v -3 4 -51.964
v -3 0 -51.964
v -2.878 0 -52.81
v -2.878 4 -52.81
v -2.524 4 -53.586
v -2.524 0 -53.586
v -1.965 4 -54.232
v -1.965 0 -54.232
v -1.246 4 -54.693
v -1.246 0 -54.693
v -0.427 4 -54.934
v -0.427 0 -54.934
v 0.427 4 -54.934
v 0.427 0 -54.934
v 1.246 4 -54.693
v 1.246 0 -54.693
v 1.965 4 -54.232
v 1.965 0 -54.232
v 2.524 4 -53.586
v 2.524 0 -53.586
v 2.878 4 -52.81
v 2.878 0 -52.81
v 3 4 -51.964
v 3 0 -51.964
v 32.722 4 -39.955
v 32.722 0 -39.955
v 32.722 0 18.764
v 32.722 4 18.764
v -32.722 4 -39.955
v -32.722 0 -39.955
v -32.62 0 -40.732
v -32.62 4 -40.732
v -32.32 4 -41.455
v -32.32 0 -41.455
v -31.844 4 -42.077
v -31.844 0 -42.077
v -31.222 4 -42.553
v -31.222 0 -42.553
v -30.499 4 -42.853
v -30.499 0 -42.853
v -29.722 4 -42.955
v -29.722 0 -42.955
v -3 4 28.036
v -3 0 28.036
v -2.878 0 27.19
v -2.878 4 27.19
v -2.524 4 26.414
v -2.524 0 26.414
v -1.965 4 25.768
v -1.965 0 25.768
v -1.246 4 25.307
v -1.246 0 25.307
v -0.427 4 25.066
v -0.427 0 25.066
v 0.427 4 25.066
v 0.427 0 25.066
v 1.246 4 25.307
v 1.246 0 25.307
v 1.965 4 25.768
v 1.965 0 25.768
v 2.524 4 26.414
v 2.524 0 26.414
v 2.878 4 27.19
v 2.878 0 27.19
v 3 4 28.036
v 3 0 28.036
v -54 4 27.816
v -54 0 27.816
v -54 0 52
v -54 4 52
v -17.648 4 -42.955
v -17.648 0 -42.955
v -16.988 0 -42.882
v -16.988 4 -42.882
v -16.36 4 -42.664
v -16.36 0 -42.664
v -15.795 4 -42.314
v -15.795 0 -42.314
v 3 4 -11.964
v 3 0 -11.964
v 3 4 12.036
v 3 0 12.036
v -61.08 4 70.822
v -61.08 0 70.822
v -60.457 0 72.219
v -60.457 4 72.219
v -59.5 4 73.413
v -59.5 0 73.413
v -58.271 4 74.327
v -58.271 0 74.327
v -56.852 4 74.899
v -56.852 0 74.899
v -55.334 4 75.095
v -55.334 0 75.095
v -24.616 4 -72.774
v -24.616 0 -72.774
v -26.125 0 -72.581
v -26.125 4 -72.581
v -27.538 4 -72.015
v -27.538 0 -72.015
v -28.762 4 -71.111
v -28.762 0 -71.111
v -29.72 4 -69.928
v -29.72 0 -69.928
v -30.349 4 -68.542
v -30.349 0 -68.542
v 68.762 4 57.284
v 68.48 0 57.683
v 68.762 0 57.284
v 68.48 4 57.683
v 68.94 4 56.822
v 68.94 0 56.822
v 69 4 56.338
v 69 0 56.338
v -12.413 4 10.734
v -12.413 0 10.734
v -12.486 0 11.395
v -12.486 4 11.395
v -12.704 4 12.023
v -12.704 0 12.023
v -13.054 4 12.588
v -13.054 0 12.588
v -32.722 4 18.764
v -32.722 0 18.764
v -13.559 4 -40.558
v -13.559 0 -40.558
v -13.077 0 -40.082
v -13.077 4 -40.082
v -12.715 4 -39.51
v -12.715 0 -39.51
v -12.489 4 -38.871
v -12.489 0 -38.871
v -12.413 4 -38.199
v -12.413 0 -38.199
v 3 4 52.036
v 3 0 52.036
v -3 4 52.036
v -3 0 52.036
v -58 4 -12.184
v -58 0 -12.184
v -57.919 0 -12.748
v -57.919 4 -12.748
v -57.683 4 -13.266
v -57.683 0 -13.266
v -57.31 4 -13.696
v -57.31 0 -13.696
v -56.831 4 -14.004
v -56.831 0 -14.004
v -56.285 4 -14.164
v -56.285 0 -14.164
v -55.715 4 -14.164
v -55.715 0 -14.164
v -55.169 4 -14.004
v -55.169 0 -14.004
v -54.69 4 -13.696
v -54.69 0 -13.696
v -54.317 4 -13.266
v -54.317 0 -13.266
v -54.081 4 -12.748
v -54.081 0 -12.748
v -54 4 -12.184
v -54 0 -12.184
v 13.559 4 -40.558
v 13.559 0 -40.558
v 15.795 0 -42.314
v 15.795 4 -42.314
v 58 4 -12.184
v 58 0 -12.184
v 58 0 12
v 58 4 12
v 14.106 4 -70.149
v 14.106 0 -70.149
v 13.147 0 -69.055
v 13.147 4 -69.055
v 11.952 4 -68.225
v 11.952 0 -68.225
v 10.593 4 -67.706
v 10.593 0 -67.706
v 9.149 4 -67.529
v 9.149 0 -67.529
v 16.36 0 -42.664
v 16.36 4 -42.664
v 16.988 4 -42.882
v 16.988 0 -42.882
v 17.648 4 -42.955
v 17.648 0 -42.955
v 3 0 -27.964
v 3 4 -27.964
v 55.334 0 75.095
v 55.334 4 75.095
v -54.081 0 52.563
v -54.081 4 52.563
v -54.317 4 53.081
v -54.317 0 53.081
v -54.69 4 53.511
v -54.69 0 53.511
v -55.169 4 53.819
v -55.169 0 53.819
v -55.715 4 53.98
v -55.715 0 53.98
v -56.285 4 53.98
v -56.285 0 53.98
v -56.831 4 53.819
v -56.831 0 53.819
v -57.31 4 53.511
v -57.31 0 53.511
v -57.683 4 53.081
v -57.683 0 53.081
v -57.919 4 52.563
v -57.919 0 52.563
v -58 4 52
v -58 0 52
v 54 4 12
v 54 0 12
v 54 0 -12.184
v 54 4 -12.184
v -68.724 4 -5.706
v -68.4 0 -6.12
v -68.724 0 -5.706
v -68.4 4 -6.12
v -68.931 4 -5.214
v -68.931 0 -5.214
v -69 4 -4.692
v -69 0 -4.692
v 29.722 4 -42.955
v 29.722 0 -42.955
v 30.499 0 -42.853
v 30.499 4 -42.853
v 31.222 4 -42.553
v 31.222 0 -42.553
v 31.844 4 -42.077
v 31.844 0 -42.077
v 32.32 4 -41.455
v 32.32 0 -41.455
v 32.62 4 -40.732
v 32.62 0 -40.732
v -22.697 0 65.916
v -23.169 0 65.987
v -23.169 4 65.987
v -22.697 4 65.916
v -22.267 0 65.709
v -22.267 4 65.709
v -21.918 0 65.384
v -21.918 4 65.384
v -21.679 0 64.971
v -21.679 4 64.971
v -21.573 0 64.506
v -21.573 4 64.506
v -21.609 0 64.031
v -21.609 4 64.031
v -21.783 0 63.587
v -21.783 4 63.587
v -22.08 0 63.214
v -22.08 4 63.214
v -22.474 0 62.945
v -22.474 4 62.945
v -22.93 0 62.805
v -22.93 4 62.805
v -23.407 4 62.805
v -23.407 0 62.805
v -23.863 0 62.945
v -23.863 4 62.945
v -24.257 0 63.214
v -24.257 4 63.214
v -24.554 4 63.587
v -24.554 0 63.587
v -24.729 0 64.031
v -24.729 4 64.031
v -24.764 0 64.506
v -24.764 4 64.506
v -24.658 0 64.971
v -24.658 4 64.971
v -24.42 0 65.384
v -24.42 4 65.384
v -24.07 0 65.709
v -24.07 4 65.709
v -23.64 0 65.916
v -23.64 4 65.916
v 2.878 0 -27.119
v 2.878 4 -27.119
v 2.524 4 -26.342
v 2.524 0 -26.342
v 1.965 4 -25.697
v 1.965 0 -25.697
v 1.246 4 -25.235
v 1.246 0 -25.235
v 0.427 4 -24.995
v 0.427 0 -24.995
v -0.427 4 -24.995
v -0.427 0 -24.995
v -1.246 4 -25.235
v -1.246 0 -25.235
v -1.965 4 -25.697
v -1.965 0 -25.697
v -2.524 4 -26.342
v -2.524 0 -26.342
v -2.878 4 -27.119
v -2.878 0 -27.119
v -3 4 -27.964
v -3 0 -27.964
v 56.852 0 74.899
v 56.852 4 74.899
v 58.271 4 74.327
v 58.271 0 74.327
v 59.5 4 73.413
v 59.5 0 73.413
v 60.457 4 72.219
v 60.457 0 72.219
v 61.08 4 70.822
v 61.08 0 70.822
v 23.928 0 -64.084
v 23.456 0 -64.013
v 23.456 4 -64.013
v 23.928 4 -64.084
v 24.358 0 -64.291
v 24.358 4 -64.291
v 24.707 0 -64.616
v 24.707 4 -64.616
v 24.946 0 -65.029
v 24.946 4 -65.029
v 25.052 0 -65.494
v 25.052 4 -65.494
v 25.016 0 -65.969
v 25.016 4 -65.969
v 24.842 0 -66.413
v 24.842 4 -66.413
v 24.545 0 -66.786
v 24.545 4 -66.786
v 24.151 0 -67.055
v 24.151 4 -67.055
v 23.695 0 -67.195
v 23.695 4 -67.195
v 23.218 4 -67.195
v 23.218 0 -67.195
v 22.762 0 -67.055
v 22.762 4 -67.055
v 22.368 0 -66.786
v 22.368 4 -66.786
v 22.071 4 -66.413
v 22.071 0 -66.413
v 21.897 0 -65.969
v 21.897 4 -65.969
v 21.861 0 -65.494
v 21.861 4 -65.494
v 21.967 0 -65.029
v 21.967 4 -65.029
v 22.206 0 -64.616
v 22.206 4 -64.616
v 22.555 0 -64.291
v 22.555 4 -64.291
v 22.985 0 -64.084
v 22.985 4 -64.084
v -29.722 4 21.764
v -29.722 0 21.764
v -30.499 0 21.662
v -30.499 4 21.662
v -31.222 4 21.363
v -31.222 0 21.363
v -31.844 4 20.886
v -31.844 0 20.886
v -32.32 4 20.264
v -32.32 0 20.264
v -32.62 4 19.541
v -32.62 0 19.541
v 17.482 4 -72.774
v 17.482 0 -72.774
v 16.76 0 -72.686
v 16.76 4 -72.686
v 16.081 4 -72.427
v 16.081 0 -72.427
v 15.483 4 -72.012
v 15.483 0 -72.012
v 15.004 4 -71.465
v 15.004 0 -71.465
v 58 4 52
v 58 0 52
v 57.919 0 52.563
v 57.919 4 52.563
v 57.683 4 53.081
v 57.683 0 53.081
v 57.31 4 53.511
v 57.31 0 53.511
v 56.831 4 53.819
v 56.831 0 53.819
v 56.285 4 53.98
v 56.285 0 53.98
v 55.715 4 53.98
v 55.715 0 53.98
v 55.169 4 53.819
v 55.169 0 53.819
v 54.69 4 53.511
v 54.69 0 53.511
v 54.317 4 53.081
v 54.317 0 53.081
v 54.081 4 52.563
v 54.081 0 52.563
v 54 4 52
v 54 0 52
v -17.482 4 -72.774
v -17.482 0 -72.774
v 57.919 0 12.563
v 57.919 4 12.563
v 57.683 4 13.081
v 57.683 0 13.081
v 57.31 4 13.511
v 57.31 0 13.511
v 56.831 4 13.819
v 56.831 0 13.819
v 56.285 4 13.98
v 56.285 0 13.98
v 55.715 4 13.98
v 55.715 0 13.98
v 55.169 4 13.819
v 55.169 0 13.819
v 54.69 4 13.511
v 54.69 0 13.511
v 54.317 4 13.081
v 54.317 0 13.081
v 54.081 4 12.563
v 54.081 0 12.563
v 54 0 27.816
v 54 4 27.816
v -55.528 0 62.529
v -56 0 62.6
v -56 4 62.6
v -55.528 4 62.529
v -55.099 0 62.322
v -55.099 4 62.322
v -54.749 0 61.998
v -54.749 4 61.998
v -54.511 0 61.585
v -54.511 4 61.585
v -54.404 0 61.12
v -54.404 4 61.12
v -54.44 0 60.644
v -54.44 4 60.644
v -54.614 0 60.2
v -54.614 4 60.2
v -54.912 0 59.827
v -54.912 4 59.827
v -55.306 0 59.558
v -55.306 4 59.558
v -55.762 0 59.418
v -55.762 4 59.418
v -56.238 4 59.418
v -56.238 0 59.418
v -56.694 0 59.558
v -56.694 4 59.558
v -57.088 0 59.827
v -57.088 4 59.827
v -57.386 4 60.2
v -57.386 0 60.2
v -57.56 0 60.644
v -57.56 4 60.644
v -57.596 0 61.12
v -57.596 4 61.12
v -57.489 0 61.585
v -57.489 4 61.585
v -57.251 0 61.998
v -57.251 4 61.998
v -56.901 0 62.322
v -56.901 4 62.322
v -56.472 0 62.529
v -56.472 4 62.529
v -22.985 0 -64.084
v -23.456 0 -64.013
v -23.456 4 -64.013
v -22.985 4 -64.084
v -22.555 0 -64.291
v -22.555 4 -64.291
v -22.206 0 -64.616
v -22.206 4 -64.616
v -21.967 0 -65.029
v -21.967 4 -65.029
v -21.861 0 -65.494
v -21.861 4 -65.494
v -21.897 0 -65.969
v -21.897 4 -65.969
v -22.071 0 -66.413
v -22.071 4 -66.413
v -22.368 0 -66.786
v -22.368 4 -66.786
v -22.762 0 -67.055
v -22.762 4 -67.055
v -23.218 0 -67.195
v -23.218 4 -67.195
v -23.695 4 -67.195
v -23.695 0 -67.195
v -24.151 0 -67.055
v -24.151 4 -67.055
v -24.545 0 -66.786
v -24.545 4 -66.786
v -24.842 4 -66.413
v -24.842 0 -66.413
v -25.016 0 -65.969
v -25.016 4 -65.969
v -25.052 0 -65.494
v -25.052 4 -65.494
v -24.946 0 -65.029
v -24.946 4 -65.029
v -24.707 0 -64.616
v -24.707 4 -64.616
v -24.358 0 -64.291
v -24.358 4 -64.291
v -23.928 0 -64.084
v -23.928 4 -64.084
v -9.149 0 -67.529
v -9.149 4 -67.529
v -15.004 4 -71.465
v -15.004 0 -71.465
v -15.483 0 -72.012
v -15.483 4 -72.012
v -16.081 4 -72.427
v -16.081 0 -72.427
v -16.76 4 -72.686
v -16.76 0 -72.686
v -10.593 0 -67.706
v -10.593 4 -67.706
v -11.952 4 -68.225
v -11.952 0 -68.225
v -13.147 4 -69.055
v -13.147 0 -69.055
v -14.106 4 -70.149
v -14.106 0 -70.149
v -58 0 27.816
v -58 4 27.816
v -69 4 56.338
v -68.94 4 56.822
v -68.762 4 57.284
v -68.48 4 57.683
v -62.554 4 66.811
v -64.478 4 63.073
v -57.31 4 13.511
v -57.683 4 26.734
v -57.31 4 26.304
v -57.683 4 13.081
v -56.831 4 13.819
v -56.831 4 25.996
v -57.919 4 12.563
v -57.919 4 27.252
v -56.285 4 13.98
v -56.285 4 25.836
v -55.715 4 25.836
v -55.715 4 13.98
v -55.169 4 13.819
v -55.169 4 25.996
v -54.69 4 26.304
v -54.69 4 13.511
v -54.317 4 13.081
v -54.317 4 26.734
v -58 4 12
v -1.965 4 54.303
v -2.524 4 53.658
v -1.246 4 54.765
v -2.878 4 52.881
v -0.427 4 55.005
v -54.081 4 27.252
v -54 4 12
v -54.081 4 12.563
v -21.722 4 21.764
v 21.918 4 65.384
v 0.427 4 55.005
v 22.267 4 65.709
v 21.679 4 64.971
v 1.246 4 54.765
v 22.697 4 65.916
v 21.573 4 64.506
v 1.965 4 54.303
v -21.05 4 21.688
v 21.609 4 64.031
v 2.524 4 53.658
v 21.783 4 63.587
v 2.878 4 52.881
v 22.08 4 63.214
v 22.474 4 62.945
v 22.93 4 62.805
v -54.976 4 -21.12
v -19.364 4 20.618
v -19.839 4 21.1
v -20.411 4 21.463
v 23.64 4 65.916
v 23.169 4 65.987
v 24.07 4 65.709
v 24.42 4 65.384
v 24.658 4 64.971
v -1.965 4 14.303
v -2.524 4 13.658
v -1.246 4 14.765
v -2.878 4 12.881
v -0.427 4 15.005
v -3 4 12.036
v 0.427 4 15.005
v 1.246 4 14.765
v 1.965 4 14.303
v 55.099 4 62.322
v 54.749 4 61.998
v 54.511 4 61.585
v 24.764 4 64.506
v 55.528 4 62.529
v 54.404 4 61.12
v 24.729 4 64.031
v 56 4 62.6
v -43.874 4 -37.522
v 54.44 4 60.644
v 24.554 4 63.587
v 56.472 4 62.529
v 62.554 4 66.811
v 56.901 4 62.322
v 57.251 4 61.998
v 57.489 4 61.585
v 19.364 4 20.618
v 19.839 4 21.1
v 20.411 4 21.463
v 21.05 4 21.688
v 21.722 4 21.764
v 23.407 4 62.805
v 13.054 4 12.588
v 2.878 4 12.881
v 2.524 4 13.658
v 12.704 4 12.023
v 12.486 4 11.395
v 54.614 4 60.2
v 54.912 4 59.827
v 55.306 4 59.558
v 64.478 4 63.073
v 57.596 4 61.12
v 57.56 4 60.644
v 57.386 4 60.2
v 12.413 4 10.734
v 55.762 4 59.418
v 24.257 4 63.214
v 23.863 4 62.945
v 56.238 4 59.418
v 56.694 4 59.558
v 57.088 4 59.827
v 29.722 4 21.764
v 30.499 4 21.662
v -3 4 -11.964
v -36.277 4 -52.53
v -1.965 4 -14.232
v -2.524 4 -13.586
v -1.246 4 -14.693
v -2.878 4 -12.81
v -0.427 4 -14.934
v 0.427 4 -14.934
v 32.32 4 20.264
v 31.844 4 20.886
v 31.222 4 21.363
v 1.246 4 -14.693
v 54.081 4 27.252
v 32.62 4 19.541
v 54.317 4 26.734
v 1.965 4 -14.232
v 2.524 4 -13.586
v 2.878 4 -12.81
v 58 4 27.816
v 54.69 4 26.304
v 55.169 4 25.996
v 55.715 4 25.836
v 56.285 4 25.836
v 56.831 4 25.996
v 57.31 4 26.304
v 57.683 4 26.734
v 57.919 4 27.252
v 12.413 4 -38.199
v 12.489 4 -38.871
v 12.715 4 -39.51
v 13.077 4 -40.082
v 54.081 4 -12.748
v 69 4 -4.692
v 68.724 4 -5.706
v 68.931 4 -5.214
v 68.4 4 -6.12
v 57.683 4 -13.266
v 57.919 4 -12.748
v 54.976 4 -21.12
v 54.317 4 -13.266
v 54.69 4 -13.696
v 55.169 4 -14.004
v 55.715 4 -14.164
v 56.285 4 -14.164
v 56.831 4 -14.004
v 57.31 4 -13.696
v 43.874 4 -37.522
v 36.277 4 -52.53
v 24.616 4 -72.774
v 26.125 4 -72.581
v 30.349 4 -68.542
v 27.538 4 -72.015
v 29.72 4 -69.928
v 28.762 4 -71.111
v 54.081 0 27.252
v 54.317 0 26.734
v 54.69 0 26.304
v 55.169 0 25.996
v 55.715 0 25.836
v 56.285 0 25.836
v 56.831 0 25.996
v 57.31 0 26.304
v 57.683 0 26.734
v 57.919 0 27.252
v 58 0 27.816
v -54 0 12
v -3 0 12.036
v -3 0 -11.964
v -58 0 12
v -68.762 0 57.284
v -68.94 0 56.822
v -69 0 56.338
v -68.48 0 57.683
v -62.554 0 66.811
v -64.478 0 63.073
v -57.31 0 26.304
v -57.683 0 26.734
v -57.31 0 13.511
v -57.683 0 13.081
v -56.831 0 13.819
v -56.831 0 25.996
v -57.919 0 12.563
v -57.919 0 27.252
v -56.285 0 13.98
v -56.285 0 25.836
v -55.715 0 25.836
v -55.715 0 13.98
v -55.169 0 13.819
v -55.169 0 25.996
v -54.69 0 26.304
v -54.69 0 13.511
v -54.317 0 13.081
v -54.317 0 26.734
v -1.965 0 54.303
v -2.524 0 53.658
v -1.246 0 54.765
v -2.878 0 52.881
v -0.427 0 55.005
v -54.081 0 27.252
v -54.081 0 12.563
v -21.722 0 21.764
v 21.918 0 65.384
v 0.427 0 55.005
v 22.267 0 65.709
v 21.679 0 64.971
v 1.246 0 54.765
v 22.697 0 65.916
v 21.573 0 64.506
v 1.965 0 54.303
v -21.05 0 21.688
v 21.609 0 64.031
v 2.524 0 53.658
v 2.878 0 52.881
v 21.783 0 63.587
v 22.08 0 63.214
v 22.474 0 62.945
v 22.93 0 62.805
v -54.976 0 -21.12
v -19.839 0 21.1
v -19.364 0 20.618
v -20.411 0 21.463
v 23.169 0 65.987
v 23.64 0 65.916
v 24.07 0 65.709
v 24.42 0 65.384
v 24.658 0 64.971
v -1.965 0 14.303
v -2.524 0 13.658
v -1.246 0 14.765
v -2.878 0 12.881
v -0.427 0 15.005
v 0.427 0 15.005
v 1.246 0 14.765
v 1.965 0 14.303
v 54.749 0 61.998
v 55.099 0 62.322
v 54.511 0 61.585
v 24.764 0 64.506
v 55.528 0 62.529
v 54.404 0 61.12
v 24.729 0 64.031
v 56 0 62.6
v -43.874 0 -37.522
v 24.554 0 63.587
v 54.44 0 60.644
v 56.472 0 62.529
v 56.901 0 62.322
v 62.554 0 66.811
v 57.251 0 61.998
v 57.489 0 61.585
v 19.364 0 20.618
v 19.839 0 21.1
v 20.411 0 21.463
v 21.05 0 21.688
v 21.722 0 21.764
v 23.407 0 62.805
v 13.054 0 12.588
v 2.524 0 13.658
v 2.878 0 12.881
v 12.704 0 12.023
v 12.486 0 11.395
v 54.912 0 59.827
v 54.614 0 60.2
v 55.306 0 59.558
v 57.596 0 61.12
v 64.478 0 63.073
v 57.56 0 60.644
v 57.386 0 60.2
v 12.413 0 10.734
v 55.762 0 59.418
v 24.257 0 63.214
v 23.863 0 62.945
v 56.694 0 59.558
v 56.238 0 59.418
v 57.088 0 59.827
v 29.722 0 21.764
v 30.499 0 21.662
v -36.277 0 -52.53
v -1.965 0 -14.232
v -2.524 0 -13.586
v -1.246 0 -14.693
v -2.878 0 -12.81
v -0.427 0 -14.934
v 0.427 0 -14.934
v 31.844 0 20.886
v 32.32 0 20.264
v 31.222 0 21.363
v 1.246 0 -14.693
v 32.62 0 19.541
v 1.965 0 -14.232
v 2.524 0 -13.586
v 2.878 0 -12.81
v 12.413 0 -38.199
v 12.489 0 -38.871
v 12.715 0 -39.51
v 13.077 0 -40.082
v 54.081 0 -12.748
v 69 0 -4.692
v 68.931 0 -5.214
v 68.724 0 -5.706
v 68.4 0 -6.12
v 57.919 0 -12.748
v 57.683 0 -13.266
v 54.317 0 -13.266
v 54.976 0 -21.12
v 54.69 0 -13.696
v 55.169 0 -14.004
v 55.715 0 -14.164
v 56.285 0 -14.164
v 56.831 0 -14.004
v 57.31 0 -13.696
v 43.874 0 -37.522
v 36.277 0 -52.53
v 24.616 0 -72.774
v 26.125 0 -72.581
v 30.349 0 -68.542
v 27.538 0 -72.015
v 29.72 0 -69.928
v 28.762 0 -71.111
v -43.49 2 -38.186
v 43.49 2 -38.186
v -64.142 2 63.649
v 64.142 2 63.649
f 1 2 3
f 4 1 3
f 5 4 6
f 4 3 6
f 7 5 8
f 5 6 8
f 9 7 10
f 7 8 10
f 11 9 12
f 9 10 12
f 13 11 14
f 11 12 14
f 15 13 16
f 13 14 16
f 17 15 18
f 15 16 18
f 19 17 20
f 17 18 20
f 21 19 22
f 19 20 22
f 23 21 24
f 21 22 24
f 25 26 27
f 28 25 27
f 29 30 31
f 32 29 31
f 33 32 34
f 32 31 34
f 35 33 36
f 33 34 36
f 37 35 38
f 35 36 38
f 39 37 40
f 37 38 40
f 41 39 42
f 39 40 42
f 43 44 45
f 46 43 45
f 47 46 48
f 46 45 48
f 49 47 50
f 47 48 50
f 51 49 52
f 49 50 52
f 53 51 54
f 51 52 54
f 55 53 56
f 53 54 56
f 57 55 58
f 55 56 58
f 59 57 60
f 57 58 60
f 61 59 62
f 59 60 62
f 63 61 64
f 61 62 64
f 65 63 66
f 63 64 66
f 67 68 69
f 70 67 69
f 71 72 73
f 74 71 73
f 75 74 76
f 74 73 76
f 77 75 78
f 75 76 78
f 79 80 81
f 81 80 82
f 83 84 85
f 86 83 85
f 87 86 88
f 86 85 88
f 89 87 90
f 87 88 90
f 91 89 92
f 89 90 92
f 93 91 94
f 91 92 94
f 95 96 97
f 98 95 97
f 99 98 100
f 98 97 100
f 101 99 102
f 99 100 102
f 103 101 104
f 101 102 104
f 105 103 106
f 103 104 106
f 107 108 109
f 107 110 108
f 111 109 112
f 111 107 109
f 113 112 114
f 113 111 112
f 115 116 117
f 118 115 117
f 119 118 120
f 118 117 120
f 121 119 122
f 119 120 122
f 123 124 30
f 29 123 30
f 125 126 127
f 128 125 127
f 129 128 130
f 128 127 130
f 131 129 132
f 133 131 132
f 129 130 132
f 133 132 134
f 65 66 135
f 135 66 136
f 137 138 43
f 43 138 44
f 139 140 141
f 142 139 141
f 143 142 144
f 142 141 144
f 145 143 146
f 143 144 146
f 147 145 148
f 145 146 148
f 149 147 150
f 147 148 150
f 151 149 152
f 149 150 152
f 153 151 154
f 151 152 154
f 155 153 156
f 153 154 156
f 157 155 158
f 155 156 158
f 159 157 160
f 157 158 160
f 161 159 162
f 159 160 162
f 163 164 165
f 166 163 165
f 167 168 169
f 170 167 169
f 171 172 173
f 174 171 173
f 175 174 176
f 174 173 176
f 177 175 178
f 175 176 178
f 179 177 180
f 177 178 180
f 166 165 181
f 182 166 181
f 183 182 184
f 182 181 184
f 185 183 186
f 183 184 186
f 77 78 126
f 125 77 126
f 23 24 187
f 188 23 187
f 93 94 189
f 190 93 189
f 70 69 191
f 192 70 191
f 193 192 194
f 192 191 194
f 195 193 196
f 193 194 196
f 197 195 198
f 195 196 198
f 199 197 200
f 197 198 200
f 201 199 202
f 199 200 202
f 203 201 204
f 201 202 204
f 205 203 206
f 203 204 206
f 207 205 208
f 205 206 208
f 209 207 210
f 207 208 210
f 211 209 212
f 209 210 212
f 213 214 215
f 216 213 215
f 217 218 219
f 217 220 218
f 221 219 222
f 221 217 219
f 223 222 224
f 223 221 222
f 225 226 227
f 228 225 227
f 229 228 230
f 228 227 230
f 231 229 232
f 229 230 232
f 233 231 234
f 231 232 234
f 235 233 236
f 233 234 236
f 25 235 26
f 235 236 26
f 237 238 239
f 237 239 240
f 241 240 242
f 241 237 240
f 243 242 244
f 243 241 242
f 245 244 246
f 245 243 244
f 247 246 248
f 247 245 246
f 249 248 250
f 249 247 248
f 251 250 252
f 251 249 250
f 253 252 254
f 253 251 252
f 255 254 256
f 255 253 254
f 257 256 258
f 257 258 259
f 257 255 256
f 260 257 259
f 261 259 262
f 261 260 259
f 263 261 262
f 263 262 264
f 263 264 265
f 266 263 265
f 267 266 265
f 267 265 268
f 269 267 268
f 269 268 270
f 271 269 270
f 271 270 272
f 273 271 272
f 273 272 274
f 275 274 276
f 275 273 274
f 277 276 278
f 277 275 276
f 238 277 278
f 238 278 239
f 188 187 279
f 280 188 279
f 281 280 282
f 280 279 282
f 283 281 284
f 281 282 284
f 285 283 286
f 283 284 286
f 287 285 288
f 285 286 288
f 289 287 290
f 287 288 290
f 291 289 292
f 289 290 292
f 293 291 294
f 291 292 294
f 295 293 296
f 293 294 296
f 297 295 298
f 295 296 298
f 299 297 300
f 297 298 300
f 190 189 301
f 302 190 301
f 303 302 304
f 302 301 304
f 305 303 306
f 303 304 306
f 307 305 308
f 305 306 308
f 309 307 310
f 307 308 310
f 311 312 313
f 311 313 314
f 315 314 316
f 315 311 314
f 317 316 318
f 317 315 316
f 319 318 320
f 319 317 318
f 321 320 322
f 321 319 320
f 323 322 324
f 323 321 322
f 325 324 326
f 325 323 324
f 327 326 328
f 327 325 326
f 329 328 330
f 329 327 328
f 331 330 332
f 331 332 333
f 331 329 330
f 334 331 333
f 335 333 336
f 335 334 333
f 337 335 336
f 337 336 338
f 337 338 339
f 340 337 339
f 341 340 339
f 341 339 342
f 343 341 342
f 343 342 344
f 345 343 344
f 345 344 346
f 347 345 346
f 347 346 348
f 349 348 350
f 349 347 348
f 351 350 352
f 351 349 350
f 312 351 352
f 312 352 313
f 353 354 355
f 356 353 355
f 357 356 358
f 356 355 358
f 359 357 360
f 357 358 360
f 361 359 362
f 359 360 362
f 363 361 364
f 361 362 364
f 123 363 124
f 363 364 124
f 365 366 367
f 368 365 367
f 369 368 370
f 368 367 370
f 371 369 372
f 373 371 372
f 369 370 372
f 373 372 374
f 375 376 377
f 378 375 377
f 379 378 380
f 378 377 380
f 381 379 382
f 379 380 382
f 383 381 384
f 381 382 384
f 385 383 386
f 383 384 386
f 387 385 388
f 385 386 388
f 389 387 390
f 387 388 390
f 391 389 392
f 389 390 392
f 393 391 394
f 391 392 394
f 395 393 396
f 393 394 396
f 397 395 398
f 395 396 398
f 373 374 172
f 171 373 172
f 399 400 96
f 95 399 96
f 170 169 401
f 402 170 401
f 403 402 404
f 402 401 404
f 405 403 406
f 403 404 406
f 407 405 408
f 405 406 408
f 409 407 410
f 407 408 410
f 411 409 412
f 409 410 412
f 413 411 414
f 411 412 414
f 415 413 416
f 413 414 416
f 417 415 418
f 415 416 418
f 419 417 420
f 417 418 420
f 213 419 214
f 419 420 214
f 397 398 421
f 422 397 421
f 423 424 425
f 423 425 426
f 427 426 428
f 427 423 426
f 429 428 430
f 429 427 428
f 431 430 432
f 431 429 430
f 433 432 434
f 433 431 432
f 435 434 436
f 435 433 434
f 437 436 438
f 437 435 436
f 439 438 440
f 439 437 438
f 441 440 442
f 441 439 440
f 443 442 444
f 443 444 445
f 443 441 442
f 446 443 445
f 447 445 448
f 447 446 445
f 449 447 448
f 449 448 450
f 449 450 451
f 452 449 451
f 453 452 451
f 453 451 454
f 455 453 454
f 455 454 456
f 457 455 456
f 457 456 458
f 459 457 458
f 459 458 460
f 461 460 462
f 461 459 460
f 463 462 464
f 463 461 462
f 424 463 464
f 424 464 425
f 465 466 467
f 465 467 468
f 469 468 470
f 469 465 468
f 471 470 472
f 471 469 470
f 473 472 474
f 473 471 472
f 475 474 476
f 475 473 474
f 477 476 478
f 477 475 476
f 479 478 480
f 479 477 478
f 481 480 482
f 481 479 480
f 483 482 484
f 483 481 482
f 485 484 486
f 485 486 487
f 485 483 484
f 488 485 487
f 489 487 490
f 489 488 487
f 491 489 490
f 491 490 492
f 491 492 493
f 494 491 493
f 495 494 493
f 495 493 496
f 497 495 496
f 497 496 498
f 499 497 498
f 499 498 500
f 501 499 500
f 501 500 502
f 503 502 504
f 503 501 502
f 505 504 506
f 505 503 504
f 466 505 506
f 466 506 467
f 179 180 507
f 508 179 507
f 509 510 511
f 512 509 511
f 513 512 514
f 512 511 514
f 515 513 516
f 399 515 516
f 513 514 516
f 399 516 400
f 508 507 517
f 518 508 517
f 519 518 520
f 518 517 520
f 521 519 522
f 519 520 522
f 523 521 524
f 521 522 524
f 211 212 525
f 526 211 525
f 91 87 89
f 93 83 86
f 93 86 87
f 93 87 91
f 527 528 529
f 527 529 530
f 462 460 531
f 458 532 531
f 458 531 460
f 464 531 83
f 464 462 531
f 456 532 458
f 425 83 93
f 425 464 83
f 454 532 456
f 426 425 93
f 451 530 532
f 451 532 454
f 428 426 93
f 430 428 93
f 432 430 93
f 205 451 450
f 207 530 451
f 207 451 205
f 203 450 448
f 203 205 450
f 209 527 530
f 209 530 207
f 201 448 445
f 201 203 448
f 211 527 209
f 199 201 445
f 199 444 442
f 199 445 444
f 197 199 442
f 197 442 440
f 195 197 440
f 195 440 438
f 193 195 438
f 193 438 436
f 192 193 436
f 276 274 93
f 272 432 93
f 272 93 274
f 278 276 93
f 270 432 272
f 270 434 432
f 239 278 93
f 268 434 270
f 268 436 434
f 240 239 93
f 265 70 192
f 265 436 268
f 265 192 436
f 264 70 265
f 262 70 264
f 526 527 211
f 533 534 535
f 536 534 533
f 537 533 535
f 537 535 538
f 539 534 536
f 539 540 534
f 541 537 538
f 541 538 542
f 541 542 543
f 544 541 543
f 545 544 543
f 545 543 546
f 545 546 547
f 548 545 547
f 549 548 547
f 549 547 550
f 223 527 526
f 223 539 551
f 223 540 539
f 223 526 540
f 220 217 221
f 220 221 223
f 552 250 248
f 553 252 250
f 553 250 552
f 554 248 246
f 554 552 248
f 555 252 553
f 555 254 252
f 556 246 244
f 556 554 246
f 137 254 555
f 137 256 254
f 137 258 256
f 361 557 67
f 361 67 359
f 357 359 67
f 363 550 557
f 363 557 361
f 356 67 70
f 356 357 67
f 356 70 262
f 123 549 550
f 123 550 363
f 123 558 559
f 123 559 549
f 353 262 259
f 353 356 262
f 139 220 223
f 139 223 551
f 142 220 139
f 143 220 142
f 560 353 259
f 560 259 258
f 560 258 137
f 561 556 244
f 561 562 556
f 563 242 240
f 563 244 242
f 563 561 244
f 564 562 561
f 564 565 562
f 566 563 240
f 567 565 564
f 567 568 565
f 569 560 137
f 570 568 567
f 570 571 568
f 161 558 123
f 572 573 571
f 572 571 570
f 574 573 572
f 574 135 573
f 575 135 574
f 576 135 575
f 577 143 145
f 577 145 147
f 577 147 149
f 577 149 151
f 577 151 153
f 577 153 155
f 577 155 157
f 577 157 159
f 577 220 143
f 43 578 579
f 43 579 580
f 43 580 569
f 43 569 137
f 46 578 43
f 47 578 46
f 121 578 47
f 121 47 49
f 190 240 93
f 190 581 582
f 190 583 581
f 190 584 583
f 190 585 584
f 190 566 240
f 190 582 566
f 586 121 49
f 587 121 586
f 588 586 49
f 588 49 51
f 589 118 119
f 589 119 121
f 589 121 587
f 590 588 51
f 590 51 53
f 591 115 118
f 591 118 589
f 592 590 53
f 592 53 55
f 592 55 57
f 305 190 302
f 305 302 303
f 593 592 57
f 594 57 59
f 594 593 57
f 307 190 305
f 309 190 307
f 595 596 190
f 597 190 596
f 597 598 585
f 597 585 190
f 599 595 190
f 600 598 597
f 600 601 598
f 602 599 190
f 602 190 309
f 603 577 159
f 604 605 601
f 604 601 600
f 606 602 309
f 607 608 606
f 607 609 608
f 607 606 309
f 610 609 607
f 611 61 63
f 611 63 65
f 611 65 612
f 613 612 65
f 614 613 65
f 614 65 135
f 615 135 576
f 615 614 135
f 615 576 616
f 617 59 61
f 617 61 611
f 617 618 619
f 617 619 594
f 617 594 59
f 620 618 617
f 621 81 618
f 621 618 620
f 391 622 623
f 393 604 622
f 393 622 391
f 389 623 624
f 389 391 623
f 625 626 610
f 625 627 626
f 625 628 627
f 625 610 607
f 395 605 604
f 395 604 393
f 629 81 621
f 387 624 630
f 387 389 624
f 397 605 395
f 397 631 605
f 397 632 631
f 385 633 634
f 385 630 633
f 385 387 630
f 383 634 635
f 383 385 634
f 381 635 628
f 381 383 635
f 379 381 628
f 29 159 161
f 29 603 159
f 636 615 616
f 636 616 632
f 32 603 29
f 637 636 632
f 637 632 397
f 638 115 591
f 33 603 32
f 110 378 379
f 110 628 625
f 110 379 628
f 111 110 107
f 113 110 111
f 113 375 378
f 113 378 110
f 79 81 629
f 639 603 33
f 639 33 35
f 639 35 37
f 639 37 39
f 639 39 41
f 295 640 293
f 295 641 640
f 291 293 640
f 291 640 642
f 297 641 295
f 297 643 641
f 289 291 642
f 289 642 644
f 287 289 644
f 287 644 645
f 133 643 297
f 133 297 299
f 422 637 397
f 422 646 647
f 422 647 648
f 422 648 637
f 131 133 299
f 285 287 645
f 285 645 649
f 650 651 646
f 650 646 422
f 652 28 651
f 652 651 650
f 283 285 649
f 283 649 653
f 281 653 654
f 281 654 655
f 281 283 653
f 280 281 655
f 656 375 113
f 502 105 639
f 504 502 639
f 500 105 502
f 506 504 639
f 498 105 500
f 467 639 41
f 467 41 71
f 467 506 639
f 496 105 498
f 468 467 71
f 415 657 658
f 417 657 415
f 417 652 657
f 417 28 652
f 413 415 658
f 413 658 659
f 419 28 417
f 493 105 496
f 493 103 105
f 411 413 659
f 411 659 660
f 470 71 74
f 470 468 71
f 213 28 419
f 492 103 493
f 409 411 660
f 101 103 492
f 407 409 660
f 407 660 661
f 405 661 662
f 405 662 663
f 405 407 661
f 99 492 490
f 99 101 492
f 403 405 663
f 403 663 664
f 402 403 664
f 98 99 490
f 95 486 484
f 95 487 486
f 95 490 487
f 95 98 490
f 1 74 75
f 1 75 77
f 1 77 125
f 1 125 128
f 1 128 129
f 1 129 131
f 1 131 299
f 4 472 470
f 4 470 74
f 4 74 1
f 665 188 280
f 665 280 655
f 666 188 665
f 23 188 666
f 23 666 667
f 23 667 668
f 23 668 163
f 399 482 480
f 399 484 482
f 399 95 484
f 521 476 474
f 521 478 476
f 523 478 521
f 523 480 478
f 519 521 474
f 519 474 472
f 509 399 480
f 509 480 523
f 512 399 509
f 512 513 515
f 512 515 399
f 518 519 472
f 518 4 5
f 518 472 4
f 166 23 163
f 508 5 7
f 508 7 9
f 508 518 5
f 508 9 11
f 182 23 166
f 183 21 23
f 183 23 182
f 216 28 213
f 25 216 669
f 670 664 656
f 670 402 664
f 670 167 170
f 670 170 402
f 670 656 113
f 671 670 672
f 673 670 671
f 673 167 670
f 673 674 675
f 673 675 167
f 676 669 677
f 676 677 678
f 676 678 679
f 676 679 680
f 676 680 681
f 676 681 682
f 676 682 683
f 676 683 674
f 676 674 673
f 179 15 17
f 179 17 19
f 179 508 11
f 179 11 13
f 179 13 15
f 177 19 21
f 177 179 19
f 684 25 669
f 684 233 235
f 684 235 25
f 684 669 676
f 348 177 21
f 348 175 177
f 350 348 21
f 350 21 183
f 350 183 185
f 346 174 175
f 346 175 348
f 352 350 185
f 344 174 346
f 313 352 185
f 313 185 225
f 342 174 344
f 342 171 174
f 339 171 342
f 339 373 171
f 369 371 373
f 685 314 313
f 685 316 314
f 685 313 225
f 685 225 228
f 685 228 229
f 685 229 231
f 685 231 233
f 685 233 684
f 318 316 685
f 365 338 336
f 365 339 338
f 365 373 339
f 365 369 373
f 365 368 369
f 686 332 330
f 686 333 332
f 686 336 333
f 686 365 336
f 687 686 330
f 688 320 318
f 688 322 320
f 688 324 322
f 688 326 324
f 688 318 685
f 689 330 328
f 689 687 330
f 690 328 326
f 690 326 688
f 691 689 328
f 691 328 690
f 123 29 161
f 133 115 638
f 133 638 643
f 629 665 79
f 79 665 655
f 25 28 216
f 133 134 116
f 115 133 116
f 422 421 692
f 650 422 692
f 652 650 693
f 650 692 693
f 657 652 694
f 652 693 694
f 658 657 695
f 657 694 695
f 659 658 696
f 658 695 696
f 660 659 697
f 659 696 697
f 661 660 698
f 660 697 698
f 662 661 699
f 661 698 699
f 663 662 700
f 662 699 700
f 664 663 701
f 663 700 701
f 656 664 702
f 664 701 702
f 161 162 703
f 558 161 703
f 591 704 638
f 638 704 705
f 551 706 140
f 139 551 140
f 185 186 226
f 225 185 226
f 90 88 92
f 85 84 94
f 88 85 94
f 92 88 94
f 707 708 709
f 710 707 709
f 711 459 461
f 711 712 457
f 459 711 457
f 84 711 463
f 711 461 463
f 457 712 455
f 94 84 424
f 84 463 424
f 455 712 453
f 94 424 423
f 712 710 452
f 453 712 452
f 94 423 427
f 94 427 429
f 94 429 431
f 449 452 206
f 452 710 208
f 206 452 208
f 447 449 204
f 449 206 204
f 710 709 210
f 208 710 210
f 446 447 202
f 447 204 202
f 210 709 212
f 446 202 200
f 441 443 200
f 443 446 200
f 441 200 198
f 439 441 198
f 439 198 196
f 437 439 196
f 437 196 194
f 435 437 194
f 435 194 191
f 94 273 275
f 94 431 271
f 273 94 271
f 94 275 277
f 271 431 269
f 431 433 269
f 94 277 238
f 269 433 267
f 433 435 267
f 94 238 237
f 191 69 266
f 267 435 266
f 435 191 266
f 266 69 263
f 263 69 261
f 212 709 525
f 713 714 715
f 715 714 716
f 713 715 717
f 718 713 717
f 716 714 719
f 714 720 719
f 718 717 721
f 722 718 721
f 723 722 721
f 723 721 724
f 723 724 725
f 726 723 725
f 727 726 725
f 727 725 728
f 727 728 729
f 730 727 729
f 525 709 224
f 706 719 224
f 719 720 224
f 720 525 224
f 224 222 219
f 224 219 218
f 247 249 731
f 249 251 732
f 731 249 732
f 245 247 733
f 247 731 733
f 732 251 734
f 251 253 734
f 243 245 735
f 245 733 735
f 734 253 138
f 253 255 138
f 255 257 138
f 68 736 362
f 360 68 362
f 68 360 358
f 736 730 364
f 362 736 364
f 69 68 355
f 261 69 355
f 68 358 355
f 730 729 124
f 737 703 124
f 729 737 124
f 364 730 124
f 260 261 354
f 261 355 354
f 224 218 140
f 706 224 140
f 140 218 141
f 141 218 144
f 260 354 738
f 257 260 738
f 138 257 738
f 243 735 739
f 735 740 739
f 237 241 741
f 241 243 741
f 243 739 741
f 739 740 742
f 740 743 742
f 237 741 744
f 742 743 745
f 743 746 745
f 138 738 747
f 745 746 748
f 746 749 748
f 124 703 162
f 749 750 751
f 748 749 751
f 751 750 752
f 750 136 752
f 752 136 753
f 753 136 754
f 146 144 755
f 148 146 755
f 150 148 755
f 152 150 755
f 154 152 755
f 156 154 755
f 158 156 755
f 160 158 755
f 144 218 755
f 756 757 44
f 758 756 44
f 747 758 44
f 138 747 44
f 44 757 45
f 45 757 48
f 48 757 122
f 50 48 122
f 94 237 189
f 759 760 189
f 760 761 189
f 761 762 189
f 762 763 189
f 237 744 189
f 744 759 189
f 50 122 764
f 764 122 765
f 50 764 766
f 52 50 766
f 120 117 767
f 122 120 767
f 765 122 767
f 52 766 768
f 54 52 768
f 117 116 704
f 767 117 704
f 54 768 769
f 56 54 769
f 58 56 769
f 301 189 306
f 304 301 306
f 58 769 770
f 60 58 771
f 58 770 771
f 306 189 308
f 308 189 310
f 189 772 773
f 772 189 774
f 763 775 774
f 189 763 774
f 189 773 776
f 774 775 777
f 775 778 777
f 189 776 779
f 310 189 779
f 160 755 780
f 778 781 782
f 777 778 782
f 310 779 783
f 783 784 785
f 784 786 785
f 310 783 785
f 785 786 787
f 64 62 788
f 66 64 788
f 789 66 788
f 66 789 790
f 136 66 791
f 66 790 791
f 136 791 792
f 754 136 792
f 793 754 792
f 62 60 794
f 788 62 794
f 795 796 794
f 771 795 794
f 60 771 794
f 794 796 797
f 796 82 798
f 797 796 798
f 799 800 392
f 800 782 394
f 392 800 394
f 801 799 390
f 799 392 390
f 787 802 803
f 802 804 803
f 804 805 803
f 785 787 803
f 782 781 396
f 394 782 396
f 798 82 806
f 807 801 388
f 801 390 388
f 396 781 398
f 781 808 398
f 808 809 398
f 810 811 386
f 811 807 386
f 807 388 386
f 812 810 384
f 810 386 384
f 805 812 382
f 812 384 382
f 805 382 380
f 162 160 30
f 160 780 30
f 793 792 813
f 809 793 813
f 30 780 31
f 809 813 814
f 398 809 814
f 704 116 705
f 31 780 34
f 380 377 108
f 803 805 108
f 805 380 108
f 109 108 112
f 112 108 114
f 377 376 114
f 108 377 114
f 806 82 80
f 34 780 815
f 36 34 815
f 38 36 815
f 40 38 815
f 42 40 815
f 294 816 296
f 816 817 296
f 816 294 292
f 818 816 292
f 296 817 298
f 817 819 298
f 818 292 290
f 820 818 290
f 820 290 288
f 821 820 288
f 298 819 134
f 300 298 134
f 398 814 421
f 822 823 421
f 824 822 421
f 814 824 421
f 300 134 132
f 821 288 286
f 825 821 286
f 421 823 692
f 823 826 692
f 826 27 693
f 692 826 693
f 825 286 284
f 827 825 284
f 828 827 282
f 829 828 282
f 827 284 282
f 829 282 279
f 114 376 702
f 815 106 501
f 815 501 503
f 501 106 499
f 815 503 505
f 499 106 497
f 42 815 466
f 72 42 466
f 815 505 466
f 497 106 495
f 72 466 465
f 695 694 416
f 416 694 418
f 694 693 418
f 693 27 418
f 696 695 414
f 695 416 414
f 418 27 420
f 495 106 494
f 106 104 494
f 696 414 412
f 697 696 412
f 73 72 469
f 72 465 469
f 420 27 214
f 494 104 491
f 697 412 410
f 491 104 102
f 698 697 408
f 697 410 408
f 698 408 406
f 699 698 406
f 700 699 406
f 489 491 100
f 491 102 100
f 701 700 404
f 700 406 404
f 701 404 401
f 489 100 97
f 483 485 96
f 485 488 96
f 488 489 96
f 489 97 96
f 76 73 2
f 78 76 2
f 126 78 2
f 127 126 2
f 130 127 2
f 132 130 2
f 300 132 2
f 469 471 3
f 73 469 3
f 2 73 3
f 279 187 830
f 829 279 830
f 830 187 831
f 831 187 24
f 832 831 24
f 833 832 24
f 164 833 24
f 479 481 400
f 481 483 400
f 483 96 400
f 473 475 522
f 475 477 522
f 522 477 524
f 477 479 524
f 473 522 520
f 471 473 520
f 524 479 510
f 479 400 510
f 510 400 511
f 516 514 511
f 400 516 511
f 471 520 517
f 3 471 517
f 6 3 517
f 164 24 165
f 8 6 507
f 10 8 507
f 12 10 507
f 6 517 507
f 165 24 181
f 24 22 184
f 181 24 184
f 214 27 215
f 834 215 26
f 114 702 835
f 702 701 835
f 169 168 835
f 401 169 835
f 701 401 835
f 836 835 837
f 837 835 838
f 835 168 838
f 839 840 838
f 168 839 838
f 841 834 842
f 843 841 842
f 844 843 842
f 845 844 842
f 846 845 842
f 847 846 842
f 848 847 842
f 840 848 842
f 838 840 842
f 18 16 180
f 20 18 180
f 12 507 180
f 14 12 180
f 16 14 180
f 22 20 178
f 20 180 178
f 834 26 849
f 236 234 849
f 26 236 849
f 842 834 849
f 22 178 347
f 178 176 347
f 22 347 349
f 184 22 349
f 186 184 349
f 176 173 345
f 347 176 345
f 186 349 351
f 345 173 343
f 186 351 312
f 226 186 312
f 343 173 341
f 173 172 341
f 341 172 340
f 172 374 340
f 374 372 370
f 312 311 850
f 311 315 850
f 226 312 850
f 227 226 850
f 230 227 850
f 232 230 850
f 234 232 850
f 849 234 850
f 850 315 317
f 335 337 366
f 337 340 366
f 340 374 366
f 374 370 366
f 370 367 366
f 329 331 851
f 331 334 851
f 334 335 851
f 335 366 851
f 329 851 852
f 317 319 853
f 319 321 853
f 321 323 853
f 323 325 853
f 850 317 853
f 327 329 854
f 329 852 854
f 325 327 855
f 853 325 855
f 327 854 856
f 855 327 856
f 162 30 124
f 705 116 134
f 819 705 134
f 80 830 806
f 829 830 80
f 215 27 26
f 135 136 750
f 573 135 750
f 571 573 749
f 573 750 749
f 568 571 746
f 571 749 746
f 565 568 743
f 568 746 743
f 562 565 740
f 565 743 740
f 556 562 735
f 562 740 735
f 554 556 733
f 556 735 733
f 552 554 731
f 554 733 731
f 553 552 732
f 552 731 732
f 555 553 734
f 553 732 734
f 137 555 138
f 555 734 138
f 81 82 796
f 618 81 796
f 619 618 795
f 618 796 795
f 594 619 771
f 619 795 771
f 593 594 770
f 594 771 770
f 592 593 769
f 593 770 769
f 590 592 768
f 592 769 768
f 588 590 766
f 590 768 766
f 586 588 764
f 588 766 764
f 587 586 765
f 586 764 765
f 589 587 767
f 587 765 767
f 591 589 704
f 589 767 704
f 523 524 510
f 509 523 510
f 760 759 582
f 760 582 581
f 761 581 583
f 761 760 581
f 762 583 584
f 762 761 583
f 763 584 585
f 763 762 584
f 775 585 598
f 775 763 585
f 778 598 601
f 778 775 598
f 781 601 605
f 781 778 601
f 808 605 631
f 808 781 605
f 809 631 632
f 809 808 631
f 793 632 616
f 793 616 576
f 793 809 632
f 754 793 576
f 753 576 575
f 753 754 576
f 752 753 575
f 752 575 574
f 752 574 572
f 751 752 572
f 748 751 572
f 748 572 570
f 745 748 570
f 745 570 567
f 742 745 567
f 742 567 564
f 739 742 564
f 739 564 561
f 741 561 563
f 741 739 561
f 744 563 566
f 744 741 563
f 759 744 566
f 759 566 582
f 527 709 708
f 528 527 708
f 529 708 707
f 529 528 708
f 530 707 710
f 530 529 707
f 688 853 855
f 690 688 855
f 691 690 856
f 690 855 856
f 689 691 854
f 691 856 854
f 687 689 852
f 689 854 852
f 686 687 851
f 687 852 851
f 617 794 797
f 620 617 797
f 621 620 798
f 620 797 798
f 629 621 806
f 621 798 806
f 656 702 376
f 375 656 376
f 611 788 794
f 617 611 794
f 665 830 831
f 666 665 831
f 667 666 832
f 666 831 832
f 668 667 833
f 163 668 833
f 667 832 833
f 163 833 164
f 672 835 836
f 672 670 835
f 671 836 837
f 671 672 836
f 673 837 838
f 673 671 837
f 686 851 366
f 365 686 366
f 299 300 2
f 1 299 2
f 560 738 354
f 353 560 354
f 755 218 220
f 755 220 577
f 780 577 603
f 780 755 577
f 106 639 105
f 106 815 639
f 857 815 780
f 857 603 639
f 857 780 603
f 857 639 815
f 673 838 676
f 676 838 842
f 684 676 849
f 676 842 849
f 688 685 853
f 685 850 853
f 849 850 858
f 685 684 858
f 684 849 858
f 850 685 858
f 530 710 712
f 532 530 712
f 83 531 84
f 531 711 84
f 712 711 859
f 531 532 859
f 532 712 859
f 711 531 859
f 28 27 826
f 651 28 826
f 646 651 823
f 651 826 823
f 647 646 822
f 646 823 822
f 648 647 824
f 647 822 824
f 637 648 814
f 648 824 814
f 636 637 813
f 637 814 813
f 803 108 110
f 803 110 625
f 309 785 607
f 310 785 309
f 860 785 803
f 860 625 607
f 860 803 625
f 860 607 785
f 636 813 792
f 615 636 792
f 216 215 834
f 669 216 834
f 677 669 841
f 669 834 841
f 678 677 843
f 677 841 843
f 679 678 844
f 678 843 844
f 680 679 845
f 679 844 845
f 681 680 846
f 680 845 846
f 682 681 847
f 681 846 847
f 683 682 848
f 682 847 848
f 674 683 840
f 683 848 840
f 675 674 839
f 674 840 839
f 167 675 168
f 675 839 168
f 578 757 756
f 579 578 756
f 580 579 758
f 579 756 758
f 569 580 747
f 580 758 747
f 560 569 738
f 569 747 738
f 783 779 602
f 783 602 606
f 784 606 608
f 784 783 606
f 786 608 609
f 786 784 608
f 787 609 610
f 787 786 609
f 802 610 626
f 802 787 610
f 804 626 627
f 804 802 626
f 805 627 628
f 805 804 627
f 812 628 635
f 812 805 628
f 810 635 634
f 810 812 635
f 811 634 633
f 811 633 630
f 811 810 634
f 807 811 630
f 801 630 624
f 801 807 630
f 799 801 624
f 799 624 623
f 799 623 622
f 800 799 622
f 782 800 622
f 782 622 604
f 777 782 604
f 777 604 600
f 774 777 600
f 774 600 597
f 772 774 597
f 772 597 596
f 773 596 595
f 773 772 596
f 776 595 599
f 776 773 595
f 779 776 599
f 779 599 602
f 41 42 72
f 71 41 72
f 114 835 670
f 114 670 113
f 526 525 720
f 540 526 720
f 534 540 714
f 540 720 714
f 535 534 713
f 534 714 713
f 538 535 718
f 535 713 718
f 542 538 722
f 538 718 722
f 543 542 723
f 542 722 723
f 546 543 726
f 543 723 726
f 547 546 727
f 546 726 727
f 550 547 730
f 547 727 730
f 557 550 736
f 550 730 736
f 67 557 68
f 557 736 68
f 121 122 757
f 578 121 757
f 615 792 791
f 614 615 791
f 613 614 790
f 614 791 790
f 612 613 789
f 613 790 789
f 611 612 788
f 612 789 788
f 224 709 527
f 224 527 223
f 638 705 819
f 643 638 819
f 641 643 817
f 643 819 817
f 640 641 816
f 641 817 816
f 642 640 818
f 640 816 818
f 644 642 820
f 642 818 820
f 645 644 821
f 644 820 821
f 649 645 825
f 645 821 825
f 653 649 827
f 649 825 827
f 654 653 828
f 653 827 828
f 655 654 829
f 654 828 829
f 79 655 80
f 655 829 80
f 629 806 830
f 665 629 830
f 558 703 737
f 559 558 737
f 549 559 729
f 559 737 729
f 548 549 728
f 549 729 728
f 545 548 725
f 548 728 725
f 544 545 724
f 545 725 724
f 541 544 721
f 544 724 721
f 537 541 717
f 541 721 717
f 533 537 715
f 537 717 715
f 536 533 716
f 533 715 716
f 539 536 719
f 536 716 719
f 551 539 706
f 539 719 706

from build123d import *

# Parameters (mm, degrees)
SKETCH3_R               = 1.6
BOSS_EXTRUDE1_DEPTH     = 4
BOSS_EXTRUDE2_DEPTH     = 4
CUT_EXTRUDE1_DEPTH      = 107.208312219
CUT_EXTRUDE1_DEPTH_BACK = 107.208312219
FILLET1_R               = 2
FILLET2_R               = 2


with BuildPart() as part:
    # Sketch3 → Boss-Extrude1 (new body)
    with BuildSketch(Plane(origin=(0, 0, 0), x_dir=(1, 0, 0), z_dir=(0, 1, 0))):
        with BuildLine():
            ThreePointArc((-73.029142624, 1.757624222), (-74.485200805, -0.256695741), (-75, -2.688273856))
            Line((-75, -2.688273856), (-75, -48.998688468))
            ThreePointArc((-75, -48.998688468), (-74.409604655, -51.594103171), (-72.754607506, -53.678744287))
            add(Edge.make_bspline(
                [(-72.754607506, -53.678744287), (-69.155494376, -56.566157963), (-64.599200983, -61.832292074), (-61.843913564, -68.281231903), (-61.080449761, -70.821562762)],
                knots=[0.094602327, 0.094602327, 0.094602327, 0.094602327, 0.56783984, 0.847958174, 0.847958174, 0.847958174, 0.847958174], degree=3))
            ThreePointArc((-61.080449761, -70.821562762), (-58.914739386, -73.90928377), (-55.334342253, -75.094643974))
            Line((-55.334342253, -75.094643974), (55.334342253, -75.094643974))
            ThreePointArc((55.334342253, -75.094643974), (58.914739386, -73.90928377), (61.080449761, -70.821562762))
            add(Edge.make_bspline(
                [(72.754607506, -53.678744287), (69.155494376, -56.566157963), (64.599200983, -61.832292074), (61.843913564, -68.281231903), (61.080449761, -70.821562762)],
                knots=[0.094602327, 0.094602327, 0.094602327, 0.094602327, 0.56783984, 0.847958174, 0.847958174, 0.847958174, 0.847958174], degree=3))
            ThreePointArc((72.754607506, -53.678744287), (74.409604655, -51.594103171), (75, -48.998688468))
            Line((75, -48.998688468), (75, -2.688273856))
            ThreePointArc((75, -2.688273856), (74.485200805, -0.256695741), (73.029142624, 1.757624222))
            add(Edge.make_bspline(
                [(73.029142624, 1.757624222), (61.044308879, 12.619007824), (44.264997441, 33.305814104), (33.66455996, 57.788254978), (30.349409152, 68.542031425)],
                knots=[0.029323898, 0.029323898, 0.029323898, 0.029323898, 0.569457767, 0.950406717, 0.950406717, 0.950406717, 0.950406717], degree=3))
            ThreePointArc((30.349409152, 68.542031425), (28.179000339, 71.601741431), (24.615679564, 72.774449742))
            Line((24.615679564, 72.774449742), (17.482147291, 72.774449742))
            ThreePointArc((17.482147291, 72.774449742), (16.080583841, 72.426924039), (15.003739939, 71.464863006))
            Line((15.003739939, 71.464863006), (14.10601108, 70.148653619))
            ThreePointArc((14.10601108, 70.148653619), (11.952323278, 68.224531553), (9.149196378, 67.529480146))
            Line((9.149196378, 67.529480146), (5.71201358, 67.529480146))
            Line((5.71201358, 67.529480146), (-5.71201358, 67.529480146))
            Line((-5.71201358, 67.529480146), (-9.149196378, 67.529480146))
            ThreePointArc((-9.149196378, 67.529480146), (-11.952323278, 68.224531553), (-14.10601108, 70.148653619))
            Line((-14.10601108, 70.148653619), (-15.003739939, 71.464863006))
            ThreePointArc((-15.003739939, 71.464863006), (-16.080583841, 72.426924039), (-17.482147291, 72.774449742))
            Line((-17.482147291, 72.774449742), (-24.615679564, 72.774449742))
            ThreePointArc((-24.615679564, 72.774449742), (-28.179000339, 71.601741431), (-30.349409152, 68.542031425))
            add(Edge.make_bspline(
                [(-73.029142624, 1.757624222), (-61.044308879, 12.619007824), (-44.264997441, 33.305814104), (-33.66455996, 57.788254978), (-30.349409152, 68.542031425)],
                knots=[0.029323898, 0.029323898, 0.029323898, 0.029323898, 0.569457767, 0.950406717, 0.950406717, 0.950406717, 0.950406717], degree=3))
        make_face()
        with Locations(Location((-56, -61, 0), (0, 0, 270))):
            Circle(SKETCH3_R, mode=Mode.SUBTRACT)
        with BuildLine():
            Line((-54, -27.815735365), (-54, -52))
            ThreePointArc((-54, -52), (-56, -54), (-58, -52))
            Line((-58, -52), (-58, -27.815735365))
            ThreePointArc((-58, -27.815735365), (-56, -25.815735365), (-54, -27.815735365))
        make_face(mode=Mode.SUBTRACT)
        with Locations(Location((-23.16862443, -64.386702544, 0), (0, 0, 270))):
            Circle(SKETCH3_R, mode=Mode.SUBTRACT)
        with Locations(Location((23.16862443, -64.386702544, 0), (0, 0, 270))):
            Circle(SKETCH3_R, mode=Mode.SUBTRACT)
        with BuildLine():
            ThreePointArc((3, -52.03567912), (0, -55.03567912), (-3, -52.03567912))
            Line((-3, -52.03567912), (-3, -28.03567912))
            ThreePointArc((-3, -28.03567912), (0, -25.03567912), (3, -28.03567912))
            Line((3, -28.03567912), (3, -52.03567912))
        make_face(mode=Mode.SUBTRACT)
        with Locations(Location((56, -61, 0), (0, 0, 270))):
            Circle(SKETCH3_R, mode=Mode.SUBTRACT)
        with BuildLine():
            ThreePointArc((58, -52), (56, -54), (54, -52))
            Line((54, -52), (54, -27.815735365))
            ThreePointArc((54, -27.815735365), (56, -25.815735365), (58, -27.815735365))
            Line((58, -27.815735365), (58, -52))
        make_face(mode=Mode.SUBTRACT)
        with BuildLine():
            Line((-54, 12.184264635), (-54, -12))
            ThreePointArc((-54, -12), (-56, -14), (-58, -12))
            Line((-58, -12), (-58, 12.184264635))
            ThreePointArc((-58, 12.184264635), (-56, 14.184264635), (-54, 12.184264635))
        make_face(mode=Mode.SUBTRACT)
        with BuildLine():
            Line((-32.722260611, -18.764434552), (-32.722260611, 39.955234216))
            ThreePointArc((-32.722260611, 39.955234216), (-31.843580954, 42.07655456), (-29.722260611, 42.955234216))
            Line((-29.722260611, 42.955234216), (-17.648417807, 42.955234216))
            ThreePointArc((-17.648417807, 42.955234216), (-16.667808417, 42.790442361), (-15.794929987, 42.314171032))
            Line((-15.794929987, 42.314171032), (-13.559239731, 40.557521751))
            ThreePointArc((-13.559239731, 40.557521751), (-12.714537097, 39.509984291), (-12.412727552, 38.198584936))
            Line((-12.412727552, 38.198584936), (-12.412727552, -10.734024286))
            ThreePointArc((-12.412727552, -10.734024286), (-12.577519407, -11.714633677), (-13.053790737, -12.587512107))
            Line((-13.053790737, -12.587512107), (-19.363526346, -20.617922372))
            ThreePointArc((-19.363526346, -20.617922372), (-20.411063806, -21.462625007), (-21.722463161, -21.764434552))
            Line((-21.722463161, -21.764434552), (-29.722260611, -21.764434552))
            ThreePointArc((-29.722260611, -21.764434552), (-31.843580954, -20.885754895), (-32.722260611, -18.764434552))
        make_face(mode=Mode.SUBTRACT)
        with Locations(Location((-23.456493673, 65.613297456, 0), (0, 0, 270))):
            Circle(SKETCH3_R, mode=Mode.SUBTRACT)
        with BuildLine():
            ThreePointArc((3, -12.03567912), (0, -15.03567912), (-3, -12.03567912))
            Line((-3, -12.03567912), (-3, 11.96432088))
            ThreePointArc((-3, 11.96432088), (0, 14.96432088), (3, 11.96432088))
            Line((3, 11.96432088), (3, -12.03567912))
        make_face(mode=Mode.SUBTRACT)
        with BuildLine():
            ThreePointArc((12.412727552, 38.198584936), (12.714537097, 39.509984291), (13.559239731, 40.557521751))
            Line((13.559239731, 40.557521751), (15.794929987, 42.314171032))
            ThreePointArc((15.794929987, 42.314171032), (16.667808417, 42.790442361), (17.648417807, 42.955234216))
            Line((17.648417807, 42.955234216), (29.722260611, 42.955234216))
            ThreePointArc((29.722260611, 42.955234216), (31.843580954, 42.07655456), (32.722260611, 39.955234216))
            Line((32.722260611, 39.955234216), (32.722260611, -18.764434552))
            ThreePointArc((32.722260611, -18.764434552), (31.843580954, -20.885754895), (29.722260611, -21.764434552))
            Line((29.722260611, -21.764434552), (21.722463161, -21.764434552))
            ThreePointArc((21.722463161, -21.764434552), (20.411063806, -21.462625007), (19.363526346, -20.617922372))
            Line((19.363526346, -20.617922372), (13.053790737, -12.587512107))
            ThreePointArc((13.053790737, -12.587512107), (12.577519407, -11.714633677), (12.412727552, -10.734024286))
            Line((12.412727552, -10.734024286), (12.412727552, 38.198584936))
        make_face(mode=Mode.SUBTRACT)
        with BuildLine():
            ThreePointArc((58, -12), (56, -14), (54, -12))
            Line((54, -12), (54, 12.184264635))
            ThreePointArc((54, 12.184264635), (56, 14.184264635), (58, 12.184264635))
            Line((58, 12.184264635), (58, -12))
        make_face(mode=Mode.SUBTRACT)
        with BuildLine():
            ThreePointArc((3, 27.96432088), (0, 24.96432088), (-3, 27.96432088))
            Line((-3, 27.96432088), (-3, 51.96432088))
            ThreePointArc((-3, 51.96432088), (0, 54.96432088), (3, 51.96432088))
            Line((3, 51.96432088), (3, 27.96432088))
        make_face(mode=Mode.SUBTRACT)
        with Locations(Location((16, 54.96432088, 0), (0, 0, 270))):
            Circle(SKETCH3_R, mode=Mode.SUBTRACT)
        with Locations(Location((23.456493673, 65.613297456, 0), (0, 0, 270))):
            Circle(SKETCH3_R, mode=Mode.SUBTRACT)
    extrude(amount=BOSS_EXTRUDE1_DEPTH)

    # Sketch5 → Boss-Extrude2 (add)
    with BuildSketch(Plane(origin=(0, 4, 0), x_dir=(1, 0, 0), z_dir=(0, 1, 0))):
        Polygon((15.245312242, 58.61530822), (12.156907233, 54.222909984), (18.333717252, 47.016631629), (24.002436461, 55.07881006), align=None)
    extrude(amount=-BOSS_EXTRUDE2_DEPTH)

    # Sketch7 → Cut-Extrude1 (cut, two sides: drawn at the far end of the back side and taken through both)
    with BuildSketch(Plane(origin=(0, 4, 0), x_dir=(1, 0, 0), z_dir=(0, 1, 0)).offset(-CUT_EXTRUDE1_DEPTH_BACK)):
        with BuildLine():
            ThreePointArc((-75, -48.998688468), (-74.409604655, -51.594103171), (-72.754607506, -53.678744287))
            add(Edge.make_bspline(
                [(-72.754607506, -53.678744287), (-71.398986726, -54.766300537), (-70.147919267, -55.913530515), (-69, -57.122898046)],
                knots=[0.094602327, 0.094602327, 0.094602327, 0.094602327, 0.272849185, 0.272849185, 0.272849185, 0.272849185], degree=3))
            Line((-69, -57.122898046), (-69, 5.535291358))
            add(Edge.make_bspline(
                [(-73.029142624, 1.757624222), (-71.658027629, 3.000211832), (-70.314990302, 4.259416425), (-69, 5.535291358)],
                knots=[0.029323898, 0.029323898, 0.029323898, 0.029323898, 0.091117467, 0.091117467, 0.091117467, 0.091117467], degree=3))
            ThreePointArc((-73.029142624, 1.757624222), (-74.485200805, -0.256695741), (-75, -2.688273856))
            Line((-75, -2.688273856), (-75, -48.998688468))
        make_face()
        with BuildLine():
            Line((69, 5.535291358), (69, -57.122898046))
            add(Edge.make_bspline(
                [(69, -57.122898046), (70.147919267, -55.913530515), (71.398986726, -54.766300537), (72.754607506, -53.678744287)],
                knots=[0.669711316, 0.669711316, 0.669711316, 0.669711316, 0.847958174, 0.847958174, 0.847958174, 0.847958174], degree=3))
            ThreePointArc((72.754607506, -53.678744287), (74.409604655, -51.594103171), (75, -48.998688468))
            Line((75, -48.998688468), (75, -2.688273856))
            ThreePointArc((75, -2.688273856), (74.485200805, -0.256695741), (73.029142624, 1.757624222))
            add(Edge.make_bspline(
                [(73.029142624, 1.757624222), (71.658027629, 3.000211832), (70.314990302, 4.259416425), (69, 5.535291358)],
                knots=[0.029323898, 0.029323898, 0.029323898, 0.029323898, 0.091117467, 0.091117467, 0.091117467, 0.091117467], degree=3))
        make_face()
    extrude(amount=CUT_EXTRUDE1_DEPTH + CUT_EXTRUDE1_DEPTH_BACK, mode=Mode.SUBTRACT)

    # Fillet1
    fillet1_edges = [part.edges().sort_by_distance(p)[0] for p in [
        (-69, 2, -5.535291358),
    ]]
    fillet(fillet1_edges, radius=FILLET1_R)

    # Fillet2
    fillet2_edges = [part.edges().sort_by_distance(p)[0] for p in [
        (-69, 2, 57.122898046),
        (69, 2, 57.122898046),
        (69, 2, -5.535291358),
    ]]
    fillet(fillet2_edges, radius=FILLET2_R)


solid = part.part
